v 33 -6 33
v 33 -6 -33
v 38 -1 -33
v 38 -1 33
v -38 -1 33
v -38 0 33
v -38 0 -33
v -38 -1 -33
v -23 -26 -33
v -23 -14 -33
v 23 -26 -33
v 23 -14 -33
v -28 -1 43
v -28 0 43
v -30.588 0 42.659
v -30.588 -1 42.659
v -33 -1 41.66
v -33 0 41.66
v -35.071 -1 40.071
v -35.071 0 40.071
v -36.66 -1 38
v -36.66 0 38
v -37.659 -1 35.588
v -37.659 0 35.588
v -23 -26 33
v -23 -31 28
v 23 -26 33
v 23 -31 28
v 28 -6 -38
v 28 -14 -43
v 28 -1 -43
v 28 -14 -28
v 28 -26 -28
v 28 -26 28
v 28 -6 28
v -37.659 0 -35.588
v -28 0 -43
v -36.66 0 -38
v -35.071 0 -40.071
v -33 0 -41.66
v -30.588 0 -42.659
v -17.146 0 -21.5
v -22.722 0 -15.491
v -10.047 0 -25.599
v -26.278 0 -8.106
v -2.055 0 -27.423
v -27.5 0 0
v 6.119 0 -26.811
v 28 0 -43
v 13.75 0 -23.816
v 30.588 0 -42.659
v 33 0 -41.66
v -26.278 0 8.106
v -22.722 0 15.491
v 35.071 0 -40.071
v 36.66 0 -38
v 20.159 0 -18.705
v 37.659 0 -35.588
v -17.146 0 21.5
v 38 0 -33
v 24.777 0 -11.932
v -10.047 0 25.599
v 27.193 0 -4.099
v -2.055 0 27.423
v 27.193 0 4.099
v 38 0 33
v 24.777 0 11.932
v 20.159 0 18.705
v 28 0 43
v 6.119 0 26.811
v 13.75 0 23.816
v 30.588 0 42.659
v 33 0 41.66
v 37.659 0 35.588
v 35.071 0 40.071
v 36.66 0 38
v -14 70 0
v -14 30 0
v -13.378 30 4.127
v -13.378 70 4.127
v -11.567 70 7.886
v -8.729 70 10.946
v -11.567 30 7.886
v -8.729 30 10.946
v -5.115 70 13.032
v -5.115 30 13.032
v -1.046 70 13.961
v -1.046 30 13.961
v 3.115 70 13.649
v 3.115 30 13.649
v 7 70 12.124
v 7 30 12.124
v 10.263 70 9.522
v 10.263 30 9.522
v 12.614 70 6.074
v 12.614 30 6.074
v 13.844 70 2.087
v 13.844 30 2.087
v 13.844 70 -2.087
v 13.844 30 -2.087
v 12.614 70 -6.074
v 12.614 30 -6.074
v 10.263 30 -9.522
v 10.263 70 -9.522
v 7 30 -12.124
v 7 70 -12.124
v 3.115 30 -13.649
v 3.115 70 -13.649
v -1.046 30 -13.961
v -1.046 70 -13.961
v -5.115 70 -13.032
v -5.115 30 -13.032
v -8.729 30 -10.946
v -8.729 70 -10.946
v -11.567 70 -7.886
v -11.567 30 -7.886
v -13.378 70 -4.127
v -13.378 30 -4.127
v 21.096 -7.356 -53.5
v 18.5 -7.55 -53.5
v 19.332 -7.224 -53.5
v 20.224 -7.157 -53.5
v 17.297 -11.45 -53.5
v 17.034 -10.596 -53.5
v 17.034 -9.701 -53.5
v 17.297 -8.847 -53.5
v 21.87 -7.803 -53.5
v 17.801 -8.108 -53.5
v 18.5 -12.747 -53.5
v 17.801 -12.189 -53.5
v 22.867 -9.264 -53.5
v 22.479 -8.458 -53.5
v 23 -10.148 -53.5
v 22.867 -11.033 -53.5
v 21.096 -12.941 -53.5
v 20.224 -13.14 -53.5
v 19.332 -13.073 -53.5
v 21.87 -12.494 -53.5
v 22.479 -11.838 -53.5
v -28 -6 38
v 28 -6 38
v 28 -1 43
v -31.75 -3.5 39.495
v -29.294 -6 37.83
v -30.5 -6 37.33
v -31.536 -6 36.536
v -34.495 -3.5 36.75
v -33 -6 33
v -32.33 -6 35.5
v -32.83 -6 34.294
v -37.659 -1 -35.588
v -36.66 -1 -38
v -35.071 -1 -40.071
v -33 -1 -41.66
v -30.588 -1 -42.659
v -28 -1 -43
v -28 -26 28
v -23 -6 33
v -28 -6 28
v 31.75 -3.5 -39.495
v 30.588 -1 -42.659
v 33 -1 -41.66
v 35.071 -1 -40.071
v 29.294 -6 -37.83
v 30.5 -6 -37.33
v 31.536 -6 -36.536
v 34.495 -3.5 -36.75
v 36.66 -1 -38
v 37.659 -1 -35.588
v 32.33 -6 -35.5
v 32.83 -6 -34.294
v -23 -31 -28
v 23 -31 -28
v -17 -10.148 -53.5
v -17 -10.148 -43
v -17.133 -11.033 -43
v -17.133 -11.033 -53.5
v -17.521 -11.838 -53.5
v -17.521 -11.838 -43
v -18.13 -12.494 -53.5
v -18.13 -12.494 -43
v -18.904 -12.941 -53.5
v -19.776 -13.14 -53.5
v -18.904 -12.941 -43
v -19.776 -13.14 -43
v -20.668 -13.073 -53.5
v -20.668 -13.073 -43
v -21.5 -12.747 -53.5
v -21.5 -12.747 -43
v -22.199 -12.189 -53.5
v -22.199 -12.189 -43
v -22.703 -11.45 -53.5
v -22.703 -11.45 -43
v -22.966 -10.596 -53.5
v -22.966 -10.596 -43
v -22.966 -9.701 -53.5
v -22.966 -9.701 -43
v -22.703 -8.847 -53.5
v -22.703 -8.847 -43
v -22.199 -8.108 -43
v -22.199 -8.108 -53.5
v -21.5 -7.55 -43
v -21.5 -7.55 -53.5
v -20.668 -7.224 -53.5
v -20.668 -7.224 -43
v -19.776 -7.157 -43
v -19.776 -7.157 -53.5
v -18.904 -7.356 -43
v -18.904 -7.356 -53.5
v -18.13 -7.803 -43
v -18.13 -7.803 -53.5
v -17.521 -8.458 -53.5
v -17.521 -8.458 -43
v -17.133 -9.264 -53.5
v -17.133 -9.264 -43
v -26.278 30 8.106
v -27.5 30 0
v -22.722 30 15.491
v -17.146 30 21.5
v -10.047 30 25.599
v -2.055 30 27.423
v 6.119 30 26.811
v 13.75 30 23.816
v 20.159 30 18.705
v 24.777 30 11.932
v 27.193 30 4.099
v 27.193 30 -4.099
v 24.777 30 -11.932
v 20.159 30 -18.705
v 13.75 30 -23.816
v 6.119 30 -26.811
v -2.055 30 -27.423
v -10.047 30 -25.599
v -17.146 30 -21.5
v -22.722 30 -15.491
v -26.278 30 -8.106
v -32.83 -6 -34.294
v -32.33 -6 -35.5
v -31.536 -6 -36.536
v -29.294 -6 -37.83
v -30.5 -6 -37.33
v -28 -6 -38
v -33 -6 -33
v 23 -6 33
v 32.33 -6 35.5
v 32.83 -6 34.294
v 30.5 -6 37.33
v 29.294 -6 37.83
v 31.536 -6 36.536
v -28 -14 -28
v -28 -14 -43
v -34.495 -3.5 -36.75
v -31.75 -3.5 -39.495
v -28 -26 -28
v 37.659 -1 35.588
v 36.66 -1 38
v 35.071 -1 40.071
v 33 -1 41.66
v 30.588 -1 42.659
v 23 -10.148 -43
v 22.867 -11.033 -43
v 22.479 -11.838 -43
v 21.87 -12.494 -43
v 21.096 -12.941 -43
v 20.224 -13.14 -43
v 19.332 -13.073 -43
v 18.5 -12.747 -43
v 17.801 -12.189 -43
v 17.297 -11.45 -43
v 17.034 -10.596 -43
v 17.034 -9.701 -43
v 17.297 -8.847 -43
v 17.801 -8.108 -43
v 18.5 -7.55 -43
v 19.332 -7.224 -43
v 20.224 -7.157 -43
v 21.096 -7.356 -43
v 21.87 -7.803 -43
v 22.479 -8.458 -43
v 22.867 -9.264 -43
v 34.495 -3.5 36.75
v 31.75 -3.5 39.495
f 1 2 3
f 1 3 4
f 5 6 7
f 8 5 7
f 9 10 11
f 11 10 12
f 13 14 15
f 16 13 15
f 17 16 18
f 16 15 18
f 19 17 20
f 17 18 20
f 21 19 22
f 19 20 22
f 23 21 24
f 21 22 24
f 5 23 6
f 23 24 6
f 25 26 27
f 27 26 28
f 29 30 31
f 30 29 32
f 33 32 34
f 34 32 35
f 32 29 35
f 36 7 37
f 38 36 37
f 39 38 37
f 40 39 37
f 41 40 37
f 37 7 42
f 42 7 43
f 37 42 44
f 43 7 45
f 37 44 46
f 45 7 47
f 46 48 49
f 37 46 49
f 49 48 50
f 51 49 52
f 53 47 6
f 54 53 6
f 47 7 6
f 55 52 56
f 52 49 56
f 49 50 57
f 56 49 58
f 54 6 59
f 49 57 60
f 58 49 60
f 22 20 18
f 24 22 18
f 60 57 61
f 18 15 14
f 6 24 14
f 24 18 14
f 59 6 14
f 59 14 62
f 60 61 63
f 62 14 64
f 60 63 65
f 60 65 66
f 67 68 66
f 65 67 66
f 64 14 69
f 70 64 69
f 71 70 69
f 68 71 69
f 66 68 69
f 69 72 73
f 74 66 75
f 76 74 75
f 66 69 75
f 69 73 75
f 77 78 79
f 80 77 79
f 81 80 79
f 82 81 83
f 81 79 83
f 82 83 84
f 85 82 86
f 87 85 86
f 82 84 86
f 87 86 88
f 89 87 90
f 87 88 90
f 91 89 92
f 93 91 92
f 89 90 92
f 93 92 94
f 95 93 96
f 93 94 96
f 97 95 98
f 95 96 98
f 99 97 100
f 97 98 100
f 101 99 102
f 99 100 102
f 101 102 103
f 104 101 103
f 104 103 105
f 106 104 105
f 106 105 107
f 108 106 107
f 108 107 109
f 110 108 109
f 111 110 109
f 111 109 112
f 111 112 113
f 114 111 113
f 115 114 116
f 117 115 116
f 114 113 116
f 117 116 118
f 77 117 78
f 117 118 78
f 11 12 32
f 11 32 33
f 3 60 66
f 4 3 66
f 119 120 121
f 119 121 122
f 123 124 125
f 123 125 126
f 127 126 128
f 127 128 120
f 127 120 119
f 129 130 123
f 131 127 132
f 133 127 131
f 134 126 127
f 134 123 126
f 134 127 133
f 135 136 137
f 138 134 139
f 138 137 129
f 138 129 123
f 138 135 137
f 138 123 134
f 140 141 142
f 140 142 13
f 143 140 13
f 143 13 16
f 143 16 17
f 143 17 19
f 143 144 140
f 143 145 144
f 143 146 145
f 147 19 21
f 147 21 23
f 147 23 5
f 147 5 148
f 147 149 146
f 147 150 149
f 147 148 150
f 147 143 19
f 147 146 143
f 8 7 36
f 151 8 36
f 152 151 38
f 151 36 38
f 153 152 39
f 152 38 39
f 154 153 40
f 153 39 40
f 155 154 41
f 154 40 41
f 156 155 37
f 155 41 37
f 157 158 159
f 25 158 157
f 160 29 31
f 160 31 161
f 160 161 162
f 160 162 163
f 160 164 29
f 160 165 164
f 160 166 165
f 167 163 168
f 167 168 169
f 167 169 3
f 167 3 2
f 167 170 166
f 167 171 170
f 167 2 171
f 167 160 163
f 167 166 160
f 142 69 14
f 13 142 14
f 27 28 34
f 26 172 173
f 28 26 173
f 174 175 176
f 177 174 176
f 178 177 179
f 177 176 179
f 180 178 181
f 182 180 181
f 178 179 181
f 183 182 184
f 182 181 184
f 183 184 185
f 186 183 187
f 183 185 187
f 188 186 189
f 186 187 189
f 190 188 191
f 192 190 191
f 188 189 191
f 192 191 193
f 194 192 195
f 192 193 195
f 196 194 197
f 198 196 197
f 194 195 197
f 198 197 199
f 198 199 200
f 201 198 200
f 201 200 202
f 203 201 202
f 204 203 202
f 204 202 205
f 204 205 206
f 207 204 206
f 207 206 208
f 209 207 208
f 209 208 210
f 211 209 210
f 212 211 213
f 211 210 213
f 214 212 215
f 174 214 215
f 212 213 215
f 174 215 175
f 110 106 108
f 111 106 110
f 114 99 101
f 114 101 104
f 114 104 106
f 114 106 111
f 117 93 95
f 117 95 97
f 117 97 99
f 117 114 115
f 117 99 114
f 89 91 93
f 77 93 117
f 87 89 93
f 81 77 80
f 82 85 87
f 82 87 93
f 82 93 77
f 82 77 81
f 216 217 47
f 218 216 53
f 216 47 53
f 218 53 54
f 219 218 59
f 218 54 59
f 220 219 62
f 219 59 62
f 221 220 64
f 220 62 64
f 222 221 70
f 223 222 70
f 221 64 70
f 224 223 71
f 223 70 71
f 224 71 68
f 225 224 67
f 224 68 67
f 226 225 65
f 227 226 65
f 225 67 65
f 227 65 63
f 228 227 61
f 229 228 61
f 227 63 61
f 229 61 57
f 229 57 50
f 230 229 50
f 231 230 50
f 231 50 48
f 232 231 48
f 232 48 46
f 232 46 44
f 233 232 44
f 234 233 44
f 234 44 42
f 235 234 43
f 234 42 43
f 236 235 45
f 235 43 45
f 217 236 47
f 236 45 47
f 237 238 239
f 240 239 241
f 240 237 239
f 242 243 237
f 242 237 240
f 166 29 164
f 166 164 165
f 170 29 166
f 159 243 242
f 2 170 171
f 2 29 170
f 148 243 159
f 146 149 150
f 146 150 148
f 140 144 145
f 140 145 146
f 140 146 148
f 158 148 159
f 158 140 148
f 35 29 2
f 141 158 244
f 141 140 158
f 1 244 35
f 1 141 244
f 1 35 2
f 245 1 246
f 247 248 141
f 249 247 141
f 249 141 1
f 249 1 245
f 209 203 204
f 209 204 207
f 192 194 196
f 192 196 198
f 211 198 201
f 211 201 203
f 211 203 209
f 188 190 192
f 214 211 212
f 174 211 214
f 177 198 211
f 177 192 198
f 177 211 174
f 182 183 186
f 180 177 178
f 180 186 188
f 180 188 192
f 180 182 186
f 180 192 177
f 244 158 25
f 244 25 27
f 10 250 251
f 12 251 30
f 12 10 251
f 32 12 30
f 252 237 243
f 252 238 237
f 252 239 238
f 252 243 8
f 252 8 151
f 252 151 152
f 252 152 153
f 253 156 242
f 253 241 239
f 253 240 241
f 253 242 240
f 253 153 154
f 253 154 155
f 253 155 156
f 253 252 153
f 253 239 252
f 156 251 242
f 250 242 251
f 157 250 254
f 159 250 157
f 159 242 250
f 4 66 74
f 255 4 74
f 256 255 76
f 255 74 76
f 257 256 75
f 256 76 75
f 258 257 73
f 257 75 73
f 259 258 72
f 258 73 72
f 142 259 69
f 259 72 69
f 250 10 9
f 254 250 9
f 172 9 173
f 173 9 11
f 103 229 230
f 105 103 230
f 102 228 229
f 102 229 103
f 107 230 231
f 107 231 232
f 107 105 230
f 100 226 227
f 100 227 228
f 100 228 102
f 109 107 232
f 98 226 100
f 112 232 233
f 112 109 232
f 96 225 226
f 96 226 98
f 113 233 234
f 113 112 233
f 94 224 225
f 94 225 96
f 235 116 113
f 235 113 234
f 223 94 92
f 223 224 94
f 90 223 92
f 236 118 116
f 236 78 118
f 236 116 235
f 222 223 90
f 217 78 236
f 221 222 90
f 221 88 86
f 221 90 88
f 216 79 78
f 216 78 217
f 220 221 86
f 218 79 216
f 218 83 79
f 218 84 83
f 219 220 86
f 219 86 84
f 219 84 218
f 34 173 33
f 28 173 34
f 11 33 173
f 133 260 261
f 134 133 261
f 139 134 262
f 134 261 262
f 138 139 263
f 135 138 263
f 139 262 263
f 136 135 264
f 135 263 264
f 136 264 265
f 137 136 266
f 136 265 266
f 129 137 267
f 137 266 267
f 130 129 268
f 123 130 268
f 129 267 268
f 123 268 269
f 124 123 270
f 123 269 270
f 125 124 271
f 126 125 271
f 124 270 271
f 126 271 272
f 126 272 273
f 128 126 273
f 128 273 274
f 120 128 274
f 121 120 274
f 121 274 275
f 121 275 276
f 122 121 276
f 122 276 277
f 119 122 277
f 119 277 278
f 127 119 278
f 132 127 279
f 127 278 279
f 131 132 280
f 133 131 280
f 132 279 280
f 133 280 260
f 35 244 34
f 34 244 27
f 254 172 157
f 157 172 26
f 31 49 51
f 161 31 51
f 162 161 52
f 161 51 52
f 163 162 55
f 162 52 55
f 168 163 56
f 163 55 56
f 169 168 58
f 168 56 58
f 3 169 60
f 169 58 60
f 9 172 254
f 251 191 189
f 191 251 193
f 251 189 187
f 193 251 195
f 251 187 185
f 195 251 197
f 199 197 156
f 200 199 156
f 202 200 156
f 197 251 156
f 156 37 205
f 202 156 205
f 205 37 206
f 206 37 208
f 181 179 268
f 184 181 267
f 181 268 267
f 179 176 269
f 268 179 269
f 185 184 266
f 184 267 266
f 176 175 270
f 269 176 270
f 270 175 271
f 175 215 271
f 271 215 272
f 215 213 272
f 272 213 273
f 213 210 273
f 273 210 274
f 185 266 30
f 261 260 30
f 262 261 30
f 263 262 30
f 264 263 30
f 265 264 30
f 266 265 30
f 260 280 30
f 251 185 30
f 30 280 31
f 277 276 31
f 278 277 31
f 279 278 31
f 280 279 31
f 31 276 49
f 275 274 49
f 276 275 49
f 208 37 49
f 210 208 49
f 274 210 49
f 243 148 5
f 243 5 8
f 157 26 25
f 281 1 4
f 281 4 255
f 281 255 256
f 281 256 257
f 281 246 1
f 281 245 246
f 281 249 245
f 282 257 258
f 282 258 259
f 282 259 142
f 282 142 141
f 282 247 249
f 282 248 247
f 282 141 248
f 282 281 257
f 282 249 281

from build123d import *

# Parameters (mm, degrees)
F1_DEPTH  = 6
F2_R      = 27.5
F3_DEPTH  = 30
F4_R      = 14
F5_DEPTH  = 40
F6_W      = 56
F6_H      = 10
F7_DEPTH  = 8
F8_R      = 3
F9_DEPTH  = 10.5
F10_W     = 56
F10_H     = 66
F11_DEPTH = 25
F12_SIZE  = 5


with BuildPart() as f1:
    # F0 (on Front) → F1 (new body)
    with BuildSketch(Plane.XZ):
        with BuildLine():
            ThreePointArc((38, 33), (35.0710678119, 40.0710678119), (28, 43))
            Line((28, 43), (-28, 43))
            ThreePointArc((-28, 43), (-35.0710678119, 40.0710678119), (-38, 33))
            Line((-38, 33), (-38, -33))
            ThreePointArc((-38, -33), (-35.0710678119, -40.0710678119), (-28, -43))
            Line((-28, -43), (28, -43))
            ThreePointArc((28, -43), (35.0710678119, -40.0710678119), (38, -33))
            Line((38, -33), (38, 33))
        make_face()
    extrude(amount=F1_DEPTH)

    # F2 (on face) → F3 (join)
    with BuildSketch(Plane(origin=(0, 0, 0), x_dir=(-1, 0, 0), z_dir=(0, 1, 0))):
        Circle(F2_R)
    extrude(amount=F3_DEPTH)

    # F4 (on face) → F5 (join)
    with BuildSketch(Plane(origin=(0, 30, 0), x_dir=(-1, 0, 0), z_dir=(0, 1, 0))):
        Circle(F4_R)
    extrude(amount=F5_DEPTH)

    # F6 (on face) → F7 (join)
    with BuildSketch(Plane.XZ.offset(6)):
        with Locations((0, -38)):
            Rectangle(F6_W, F6_H)
    extrude(amount=F7_DEPTH)

    # F8 (on face) → F9 (join)
    with BuildSketch(Plane(origin=(0, 0, -43), x_dir=(1, 0, 0), z_dir=(0, 0, -1))):
        with Locations((-20, 10.148444213)):
            Circle(F8_R)
        with Locations((20, 10.148444213)):
            Circle(F8_R)
    extrude(amount=F9_DEPTH)

    # F10 (on face) → F11 (join)
    with BuildSketch(Plane.XZ.offset(6)):
        Rectangle(F10_W, F10_H)
    extrude(amount=F11_DEPTH)

    # F12
    f12_edges = [f1.edges().sort_by_distance(p)[0] for p in [
        (0, -31, 33),
        (28, -31, 0),
        (-28, -31, 0),
        (-28, -18.5, 33),
        (28, -18.5, 33),
        (28, -22.5, -33),
        (0, -31, -33),
        (-28, -22.5, -33),
        (0, -6, 43),
    ]]
    chamfer(f12_edges, length=F12_SIZE)


solid = f1.part
